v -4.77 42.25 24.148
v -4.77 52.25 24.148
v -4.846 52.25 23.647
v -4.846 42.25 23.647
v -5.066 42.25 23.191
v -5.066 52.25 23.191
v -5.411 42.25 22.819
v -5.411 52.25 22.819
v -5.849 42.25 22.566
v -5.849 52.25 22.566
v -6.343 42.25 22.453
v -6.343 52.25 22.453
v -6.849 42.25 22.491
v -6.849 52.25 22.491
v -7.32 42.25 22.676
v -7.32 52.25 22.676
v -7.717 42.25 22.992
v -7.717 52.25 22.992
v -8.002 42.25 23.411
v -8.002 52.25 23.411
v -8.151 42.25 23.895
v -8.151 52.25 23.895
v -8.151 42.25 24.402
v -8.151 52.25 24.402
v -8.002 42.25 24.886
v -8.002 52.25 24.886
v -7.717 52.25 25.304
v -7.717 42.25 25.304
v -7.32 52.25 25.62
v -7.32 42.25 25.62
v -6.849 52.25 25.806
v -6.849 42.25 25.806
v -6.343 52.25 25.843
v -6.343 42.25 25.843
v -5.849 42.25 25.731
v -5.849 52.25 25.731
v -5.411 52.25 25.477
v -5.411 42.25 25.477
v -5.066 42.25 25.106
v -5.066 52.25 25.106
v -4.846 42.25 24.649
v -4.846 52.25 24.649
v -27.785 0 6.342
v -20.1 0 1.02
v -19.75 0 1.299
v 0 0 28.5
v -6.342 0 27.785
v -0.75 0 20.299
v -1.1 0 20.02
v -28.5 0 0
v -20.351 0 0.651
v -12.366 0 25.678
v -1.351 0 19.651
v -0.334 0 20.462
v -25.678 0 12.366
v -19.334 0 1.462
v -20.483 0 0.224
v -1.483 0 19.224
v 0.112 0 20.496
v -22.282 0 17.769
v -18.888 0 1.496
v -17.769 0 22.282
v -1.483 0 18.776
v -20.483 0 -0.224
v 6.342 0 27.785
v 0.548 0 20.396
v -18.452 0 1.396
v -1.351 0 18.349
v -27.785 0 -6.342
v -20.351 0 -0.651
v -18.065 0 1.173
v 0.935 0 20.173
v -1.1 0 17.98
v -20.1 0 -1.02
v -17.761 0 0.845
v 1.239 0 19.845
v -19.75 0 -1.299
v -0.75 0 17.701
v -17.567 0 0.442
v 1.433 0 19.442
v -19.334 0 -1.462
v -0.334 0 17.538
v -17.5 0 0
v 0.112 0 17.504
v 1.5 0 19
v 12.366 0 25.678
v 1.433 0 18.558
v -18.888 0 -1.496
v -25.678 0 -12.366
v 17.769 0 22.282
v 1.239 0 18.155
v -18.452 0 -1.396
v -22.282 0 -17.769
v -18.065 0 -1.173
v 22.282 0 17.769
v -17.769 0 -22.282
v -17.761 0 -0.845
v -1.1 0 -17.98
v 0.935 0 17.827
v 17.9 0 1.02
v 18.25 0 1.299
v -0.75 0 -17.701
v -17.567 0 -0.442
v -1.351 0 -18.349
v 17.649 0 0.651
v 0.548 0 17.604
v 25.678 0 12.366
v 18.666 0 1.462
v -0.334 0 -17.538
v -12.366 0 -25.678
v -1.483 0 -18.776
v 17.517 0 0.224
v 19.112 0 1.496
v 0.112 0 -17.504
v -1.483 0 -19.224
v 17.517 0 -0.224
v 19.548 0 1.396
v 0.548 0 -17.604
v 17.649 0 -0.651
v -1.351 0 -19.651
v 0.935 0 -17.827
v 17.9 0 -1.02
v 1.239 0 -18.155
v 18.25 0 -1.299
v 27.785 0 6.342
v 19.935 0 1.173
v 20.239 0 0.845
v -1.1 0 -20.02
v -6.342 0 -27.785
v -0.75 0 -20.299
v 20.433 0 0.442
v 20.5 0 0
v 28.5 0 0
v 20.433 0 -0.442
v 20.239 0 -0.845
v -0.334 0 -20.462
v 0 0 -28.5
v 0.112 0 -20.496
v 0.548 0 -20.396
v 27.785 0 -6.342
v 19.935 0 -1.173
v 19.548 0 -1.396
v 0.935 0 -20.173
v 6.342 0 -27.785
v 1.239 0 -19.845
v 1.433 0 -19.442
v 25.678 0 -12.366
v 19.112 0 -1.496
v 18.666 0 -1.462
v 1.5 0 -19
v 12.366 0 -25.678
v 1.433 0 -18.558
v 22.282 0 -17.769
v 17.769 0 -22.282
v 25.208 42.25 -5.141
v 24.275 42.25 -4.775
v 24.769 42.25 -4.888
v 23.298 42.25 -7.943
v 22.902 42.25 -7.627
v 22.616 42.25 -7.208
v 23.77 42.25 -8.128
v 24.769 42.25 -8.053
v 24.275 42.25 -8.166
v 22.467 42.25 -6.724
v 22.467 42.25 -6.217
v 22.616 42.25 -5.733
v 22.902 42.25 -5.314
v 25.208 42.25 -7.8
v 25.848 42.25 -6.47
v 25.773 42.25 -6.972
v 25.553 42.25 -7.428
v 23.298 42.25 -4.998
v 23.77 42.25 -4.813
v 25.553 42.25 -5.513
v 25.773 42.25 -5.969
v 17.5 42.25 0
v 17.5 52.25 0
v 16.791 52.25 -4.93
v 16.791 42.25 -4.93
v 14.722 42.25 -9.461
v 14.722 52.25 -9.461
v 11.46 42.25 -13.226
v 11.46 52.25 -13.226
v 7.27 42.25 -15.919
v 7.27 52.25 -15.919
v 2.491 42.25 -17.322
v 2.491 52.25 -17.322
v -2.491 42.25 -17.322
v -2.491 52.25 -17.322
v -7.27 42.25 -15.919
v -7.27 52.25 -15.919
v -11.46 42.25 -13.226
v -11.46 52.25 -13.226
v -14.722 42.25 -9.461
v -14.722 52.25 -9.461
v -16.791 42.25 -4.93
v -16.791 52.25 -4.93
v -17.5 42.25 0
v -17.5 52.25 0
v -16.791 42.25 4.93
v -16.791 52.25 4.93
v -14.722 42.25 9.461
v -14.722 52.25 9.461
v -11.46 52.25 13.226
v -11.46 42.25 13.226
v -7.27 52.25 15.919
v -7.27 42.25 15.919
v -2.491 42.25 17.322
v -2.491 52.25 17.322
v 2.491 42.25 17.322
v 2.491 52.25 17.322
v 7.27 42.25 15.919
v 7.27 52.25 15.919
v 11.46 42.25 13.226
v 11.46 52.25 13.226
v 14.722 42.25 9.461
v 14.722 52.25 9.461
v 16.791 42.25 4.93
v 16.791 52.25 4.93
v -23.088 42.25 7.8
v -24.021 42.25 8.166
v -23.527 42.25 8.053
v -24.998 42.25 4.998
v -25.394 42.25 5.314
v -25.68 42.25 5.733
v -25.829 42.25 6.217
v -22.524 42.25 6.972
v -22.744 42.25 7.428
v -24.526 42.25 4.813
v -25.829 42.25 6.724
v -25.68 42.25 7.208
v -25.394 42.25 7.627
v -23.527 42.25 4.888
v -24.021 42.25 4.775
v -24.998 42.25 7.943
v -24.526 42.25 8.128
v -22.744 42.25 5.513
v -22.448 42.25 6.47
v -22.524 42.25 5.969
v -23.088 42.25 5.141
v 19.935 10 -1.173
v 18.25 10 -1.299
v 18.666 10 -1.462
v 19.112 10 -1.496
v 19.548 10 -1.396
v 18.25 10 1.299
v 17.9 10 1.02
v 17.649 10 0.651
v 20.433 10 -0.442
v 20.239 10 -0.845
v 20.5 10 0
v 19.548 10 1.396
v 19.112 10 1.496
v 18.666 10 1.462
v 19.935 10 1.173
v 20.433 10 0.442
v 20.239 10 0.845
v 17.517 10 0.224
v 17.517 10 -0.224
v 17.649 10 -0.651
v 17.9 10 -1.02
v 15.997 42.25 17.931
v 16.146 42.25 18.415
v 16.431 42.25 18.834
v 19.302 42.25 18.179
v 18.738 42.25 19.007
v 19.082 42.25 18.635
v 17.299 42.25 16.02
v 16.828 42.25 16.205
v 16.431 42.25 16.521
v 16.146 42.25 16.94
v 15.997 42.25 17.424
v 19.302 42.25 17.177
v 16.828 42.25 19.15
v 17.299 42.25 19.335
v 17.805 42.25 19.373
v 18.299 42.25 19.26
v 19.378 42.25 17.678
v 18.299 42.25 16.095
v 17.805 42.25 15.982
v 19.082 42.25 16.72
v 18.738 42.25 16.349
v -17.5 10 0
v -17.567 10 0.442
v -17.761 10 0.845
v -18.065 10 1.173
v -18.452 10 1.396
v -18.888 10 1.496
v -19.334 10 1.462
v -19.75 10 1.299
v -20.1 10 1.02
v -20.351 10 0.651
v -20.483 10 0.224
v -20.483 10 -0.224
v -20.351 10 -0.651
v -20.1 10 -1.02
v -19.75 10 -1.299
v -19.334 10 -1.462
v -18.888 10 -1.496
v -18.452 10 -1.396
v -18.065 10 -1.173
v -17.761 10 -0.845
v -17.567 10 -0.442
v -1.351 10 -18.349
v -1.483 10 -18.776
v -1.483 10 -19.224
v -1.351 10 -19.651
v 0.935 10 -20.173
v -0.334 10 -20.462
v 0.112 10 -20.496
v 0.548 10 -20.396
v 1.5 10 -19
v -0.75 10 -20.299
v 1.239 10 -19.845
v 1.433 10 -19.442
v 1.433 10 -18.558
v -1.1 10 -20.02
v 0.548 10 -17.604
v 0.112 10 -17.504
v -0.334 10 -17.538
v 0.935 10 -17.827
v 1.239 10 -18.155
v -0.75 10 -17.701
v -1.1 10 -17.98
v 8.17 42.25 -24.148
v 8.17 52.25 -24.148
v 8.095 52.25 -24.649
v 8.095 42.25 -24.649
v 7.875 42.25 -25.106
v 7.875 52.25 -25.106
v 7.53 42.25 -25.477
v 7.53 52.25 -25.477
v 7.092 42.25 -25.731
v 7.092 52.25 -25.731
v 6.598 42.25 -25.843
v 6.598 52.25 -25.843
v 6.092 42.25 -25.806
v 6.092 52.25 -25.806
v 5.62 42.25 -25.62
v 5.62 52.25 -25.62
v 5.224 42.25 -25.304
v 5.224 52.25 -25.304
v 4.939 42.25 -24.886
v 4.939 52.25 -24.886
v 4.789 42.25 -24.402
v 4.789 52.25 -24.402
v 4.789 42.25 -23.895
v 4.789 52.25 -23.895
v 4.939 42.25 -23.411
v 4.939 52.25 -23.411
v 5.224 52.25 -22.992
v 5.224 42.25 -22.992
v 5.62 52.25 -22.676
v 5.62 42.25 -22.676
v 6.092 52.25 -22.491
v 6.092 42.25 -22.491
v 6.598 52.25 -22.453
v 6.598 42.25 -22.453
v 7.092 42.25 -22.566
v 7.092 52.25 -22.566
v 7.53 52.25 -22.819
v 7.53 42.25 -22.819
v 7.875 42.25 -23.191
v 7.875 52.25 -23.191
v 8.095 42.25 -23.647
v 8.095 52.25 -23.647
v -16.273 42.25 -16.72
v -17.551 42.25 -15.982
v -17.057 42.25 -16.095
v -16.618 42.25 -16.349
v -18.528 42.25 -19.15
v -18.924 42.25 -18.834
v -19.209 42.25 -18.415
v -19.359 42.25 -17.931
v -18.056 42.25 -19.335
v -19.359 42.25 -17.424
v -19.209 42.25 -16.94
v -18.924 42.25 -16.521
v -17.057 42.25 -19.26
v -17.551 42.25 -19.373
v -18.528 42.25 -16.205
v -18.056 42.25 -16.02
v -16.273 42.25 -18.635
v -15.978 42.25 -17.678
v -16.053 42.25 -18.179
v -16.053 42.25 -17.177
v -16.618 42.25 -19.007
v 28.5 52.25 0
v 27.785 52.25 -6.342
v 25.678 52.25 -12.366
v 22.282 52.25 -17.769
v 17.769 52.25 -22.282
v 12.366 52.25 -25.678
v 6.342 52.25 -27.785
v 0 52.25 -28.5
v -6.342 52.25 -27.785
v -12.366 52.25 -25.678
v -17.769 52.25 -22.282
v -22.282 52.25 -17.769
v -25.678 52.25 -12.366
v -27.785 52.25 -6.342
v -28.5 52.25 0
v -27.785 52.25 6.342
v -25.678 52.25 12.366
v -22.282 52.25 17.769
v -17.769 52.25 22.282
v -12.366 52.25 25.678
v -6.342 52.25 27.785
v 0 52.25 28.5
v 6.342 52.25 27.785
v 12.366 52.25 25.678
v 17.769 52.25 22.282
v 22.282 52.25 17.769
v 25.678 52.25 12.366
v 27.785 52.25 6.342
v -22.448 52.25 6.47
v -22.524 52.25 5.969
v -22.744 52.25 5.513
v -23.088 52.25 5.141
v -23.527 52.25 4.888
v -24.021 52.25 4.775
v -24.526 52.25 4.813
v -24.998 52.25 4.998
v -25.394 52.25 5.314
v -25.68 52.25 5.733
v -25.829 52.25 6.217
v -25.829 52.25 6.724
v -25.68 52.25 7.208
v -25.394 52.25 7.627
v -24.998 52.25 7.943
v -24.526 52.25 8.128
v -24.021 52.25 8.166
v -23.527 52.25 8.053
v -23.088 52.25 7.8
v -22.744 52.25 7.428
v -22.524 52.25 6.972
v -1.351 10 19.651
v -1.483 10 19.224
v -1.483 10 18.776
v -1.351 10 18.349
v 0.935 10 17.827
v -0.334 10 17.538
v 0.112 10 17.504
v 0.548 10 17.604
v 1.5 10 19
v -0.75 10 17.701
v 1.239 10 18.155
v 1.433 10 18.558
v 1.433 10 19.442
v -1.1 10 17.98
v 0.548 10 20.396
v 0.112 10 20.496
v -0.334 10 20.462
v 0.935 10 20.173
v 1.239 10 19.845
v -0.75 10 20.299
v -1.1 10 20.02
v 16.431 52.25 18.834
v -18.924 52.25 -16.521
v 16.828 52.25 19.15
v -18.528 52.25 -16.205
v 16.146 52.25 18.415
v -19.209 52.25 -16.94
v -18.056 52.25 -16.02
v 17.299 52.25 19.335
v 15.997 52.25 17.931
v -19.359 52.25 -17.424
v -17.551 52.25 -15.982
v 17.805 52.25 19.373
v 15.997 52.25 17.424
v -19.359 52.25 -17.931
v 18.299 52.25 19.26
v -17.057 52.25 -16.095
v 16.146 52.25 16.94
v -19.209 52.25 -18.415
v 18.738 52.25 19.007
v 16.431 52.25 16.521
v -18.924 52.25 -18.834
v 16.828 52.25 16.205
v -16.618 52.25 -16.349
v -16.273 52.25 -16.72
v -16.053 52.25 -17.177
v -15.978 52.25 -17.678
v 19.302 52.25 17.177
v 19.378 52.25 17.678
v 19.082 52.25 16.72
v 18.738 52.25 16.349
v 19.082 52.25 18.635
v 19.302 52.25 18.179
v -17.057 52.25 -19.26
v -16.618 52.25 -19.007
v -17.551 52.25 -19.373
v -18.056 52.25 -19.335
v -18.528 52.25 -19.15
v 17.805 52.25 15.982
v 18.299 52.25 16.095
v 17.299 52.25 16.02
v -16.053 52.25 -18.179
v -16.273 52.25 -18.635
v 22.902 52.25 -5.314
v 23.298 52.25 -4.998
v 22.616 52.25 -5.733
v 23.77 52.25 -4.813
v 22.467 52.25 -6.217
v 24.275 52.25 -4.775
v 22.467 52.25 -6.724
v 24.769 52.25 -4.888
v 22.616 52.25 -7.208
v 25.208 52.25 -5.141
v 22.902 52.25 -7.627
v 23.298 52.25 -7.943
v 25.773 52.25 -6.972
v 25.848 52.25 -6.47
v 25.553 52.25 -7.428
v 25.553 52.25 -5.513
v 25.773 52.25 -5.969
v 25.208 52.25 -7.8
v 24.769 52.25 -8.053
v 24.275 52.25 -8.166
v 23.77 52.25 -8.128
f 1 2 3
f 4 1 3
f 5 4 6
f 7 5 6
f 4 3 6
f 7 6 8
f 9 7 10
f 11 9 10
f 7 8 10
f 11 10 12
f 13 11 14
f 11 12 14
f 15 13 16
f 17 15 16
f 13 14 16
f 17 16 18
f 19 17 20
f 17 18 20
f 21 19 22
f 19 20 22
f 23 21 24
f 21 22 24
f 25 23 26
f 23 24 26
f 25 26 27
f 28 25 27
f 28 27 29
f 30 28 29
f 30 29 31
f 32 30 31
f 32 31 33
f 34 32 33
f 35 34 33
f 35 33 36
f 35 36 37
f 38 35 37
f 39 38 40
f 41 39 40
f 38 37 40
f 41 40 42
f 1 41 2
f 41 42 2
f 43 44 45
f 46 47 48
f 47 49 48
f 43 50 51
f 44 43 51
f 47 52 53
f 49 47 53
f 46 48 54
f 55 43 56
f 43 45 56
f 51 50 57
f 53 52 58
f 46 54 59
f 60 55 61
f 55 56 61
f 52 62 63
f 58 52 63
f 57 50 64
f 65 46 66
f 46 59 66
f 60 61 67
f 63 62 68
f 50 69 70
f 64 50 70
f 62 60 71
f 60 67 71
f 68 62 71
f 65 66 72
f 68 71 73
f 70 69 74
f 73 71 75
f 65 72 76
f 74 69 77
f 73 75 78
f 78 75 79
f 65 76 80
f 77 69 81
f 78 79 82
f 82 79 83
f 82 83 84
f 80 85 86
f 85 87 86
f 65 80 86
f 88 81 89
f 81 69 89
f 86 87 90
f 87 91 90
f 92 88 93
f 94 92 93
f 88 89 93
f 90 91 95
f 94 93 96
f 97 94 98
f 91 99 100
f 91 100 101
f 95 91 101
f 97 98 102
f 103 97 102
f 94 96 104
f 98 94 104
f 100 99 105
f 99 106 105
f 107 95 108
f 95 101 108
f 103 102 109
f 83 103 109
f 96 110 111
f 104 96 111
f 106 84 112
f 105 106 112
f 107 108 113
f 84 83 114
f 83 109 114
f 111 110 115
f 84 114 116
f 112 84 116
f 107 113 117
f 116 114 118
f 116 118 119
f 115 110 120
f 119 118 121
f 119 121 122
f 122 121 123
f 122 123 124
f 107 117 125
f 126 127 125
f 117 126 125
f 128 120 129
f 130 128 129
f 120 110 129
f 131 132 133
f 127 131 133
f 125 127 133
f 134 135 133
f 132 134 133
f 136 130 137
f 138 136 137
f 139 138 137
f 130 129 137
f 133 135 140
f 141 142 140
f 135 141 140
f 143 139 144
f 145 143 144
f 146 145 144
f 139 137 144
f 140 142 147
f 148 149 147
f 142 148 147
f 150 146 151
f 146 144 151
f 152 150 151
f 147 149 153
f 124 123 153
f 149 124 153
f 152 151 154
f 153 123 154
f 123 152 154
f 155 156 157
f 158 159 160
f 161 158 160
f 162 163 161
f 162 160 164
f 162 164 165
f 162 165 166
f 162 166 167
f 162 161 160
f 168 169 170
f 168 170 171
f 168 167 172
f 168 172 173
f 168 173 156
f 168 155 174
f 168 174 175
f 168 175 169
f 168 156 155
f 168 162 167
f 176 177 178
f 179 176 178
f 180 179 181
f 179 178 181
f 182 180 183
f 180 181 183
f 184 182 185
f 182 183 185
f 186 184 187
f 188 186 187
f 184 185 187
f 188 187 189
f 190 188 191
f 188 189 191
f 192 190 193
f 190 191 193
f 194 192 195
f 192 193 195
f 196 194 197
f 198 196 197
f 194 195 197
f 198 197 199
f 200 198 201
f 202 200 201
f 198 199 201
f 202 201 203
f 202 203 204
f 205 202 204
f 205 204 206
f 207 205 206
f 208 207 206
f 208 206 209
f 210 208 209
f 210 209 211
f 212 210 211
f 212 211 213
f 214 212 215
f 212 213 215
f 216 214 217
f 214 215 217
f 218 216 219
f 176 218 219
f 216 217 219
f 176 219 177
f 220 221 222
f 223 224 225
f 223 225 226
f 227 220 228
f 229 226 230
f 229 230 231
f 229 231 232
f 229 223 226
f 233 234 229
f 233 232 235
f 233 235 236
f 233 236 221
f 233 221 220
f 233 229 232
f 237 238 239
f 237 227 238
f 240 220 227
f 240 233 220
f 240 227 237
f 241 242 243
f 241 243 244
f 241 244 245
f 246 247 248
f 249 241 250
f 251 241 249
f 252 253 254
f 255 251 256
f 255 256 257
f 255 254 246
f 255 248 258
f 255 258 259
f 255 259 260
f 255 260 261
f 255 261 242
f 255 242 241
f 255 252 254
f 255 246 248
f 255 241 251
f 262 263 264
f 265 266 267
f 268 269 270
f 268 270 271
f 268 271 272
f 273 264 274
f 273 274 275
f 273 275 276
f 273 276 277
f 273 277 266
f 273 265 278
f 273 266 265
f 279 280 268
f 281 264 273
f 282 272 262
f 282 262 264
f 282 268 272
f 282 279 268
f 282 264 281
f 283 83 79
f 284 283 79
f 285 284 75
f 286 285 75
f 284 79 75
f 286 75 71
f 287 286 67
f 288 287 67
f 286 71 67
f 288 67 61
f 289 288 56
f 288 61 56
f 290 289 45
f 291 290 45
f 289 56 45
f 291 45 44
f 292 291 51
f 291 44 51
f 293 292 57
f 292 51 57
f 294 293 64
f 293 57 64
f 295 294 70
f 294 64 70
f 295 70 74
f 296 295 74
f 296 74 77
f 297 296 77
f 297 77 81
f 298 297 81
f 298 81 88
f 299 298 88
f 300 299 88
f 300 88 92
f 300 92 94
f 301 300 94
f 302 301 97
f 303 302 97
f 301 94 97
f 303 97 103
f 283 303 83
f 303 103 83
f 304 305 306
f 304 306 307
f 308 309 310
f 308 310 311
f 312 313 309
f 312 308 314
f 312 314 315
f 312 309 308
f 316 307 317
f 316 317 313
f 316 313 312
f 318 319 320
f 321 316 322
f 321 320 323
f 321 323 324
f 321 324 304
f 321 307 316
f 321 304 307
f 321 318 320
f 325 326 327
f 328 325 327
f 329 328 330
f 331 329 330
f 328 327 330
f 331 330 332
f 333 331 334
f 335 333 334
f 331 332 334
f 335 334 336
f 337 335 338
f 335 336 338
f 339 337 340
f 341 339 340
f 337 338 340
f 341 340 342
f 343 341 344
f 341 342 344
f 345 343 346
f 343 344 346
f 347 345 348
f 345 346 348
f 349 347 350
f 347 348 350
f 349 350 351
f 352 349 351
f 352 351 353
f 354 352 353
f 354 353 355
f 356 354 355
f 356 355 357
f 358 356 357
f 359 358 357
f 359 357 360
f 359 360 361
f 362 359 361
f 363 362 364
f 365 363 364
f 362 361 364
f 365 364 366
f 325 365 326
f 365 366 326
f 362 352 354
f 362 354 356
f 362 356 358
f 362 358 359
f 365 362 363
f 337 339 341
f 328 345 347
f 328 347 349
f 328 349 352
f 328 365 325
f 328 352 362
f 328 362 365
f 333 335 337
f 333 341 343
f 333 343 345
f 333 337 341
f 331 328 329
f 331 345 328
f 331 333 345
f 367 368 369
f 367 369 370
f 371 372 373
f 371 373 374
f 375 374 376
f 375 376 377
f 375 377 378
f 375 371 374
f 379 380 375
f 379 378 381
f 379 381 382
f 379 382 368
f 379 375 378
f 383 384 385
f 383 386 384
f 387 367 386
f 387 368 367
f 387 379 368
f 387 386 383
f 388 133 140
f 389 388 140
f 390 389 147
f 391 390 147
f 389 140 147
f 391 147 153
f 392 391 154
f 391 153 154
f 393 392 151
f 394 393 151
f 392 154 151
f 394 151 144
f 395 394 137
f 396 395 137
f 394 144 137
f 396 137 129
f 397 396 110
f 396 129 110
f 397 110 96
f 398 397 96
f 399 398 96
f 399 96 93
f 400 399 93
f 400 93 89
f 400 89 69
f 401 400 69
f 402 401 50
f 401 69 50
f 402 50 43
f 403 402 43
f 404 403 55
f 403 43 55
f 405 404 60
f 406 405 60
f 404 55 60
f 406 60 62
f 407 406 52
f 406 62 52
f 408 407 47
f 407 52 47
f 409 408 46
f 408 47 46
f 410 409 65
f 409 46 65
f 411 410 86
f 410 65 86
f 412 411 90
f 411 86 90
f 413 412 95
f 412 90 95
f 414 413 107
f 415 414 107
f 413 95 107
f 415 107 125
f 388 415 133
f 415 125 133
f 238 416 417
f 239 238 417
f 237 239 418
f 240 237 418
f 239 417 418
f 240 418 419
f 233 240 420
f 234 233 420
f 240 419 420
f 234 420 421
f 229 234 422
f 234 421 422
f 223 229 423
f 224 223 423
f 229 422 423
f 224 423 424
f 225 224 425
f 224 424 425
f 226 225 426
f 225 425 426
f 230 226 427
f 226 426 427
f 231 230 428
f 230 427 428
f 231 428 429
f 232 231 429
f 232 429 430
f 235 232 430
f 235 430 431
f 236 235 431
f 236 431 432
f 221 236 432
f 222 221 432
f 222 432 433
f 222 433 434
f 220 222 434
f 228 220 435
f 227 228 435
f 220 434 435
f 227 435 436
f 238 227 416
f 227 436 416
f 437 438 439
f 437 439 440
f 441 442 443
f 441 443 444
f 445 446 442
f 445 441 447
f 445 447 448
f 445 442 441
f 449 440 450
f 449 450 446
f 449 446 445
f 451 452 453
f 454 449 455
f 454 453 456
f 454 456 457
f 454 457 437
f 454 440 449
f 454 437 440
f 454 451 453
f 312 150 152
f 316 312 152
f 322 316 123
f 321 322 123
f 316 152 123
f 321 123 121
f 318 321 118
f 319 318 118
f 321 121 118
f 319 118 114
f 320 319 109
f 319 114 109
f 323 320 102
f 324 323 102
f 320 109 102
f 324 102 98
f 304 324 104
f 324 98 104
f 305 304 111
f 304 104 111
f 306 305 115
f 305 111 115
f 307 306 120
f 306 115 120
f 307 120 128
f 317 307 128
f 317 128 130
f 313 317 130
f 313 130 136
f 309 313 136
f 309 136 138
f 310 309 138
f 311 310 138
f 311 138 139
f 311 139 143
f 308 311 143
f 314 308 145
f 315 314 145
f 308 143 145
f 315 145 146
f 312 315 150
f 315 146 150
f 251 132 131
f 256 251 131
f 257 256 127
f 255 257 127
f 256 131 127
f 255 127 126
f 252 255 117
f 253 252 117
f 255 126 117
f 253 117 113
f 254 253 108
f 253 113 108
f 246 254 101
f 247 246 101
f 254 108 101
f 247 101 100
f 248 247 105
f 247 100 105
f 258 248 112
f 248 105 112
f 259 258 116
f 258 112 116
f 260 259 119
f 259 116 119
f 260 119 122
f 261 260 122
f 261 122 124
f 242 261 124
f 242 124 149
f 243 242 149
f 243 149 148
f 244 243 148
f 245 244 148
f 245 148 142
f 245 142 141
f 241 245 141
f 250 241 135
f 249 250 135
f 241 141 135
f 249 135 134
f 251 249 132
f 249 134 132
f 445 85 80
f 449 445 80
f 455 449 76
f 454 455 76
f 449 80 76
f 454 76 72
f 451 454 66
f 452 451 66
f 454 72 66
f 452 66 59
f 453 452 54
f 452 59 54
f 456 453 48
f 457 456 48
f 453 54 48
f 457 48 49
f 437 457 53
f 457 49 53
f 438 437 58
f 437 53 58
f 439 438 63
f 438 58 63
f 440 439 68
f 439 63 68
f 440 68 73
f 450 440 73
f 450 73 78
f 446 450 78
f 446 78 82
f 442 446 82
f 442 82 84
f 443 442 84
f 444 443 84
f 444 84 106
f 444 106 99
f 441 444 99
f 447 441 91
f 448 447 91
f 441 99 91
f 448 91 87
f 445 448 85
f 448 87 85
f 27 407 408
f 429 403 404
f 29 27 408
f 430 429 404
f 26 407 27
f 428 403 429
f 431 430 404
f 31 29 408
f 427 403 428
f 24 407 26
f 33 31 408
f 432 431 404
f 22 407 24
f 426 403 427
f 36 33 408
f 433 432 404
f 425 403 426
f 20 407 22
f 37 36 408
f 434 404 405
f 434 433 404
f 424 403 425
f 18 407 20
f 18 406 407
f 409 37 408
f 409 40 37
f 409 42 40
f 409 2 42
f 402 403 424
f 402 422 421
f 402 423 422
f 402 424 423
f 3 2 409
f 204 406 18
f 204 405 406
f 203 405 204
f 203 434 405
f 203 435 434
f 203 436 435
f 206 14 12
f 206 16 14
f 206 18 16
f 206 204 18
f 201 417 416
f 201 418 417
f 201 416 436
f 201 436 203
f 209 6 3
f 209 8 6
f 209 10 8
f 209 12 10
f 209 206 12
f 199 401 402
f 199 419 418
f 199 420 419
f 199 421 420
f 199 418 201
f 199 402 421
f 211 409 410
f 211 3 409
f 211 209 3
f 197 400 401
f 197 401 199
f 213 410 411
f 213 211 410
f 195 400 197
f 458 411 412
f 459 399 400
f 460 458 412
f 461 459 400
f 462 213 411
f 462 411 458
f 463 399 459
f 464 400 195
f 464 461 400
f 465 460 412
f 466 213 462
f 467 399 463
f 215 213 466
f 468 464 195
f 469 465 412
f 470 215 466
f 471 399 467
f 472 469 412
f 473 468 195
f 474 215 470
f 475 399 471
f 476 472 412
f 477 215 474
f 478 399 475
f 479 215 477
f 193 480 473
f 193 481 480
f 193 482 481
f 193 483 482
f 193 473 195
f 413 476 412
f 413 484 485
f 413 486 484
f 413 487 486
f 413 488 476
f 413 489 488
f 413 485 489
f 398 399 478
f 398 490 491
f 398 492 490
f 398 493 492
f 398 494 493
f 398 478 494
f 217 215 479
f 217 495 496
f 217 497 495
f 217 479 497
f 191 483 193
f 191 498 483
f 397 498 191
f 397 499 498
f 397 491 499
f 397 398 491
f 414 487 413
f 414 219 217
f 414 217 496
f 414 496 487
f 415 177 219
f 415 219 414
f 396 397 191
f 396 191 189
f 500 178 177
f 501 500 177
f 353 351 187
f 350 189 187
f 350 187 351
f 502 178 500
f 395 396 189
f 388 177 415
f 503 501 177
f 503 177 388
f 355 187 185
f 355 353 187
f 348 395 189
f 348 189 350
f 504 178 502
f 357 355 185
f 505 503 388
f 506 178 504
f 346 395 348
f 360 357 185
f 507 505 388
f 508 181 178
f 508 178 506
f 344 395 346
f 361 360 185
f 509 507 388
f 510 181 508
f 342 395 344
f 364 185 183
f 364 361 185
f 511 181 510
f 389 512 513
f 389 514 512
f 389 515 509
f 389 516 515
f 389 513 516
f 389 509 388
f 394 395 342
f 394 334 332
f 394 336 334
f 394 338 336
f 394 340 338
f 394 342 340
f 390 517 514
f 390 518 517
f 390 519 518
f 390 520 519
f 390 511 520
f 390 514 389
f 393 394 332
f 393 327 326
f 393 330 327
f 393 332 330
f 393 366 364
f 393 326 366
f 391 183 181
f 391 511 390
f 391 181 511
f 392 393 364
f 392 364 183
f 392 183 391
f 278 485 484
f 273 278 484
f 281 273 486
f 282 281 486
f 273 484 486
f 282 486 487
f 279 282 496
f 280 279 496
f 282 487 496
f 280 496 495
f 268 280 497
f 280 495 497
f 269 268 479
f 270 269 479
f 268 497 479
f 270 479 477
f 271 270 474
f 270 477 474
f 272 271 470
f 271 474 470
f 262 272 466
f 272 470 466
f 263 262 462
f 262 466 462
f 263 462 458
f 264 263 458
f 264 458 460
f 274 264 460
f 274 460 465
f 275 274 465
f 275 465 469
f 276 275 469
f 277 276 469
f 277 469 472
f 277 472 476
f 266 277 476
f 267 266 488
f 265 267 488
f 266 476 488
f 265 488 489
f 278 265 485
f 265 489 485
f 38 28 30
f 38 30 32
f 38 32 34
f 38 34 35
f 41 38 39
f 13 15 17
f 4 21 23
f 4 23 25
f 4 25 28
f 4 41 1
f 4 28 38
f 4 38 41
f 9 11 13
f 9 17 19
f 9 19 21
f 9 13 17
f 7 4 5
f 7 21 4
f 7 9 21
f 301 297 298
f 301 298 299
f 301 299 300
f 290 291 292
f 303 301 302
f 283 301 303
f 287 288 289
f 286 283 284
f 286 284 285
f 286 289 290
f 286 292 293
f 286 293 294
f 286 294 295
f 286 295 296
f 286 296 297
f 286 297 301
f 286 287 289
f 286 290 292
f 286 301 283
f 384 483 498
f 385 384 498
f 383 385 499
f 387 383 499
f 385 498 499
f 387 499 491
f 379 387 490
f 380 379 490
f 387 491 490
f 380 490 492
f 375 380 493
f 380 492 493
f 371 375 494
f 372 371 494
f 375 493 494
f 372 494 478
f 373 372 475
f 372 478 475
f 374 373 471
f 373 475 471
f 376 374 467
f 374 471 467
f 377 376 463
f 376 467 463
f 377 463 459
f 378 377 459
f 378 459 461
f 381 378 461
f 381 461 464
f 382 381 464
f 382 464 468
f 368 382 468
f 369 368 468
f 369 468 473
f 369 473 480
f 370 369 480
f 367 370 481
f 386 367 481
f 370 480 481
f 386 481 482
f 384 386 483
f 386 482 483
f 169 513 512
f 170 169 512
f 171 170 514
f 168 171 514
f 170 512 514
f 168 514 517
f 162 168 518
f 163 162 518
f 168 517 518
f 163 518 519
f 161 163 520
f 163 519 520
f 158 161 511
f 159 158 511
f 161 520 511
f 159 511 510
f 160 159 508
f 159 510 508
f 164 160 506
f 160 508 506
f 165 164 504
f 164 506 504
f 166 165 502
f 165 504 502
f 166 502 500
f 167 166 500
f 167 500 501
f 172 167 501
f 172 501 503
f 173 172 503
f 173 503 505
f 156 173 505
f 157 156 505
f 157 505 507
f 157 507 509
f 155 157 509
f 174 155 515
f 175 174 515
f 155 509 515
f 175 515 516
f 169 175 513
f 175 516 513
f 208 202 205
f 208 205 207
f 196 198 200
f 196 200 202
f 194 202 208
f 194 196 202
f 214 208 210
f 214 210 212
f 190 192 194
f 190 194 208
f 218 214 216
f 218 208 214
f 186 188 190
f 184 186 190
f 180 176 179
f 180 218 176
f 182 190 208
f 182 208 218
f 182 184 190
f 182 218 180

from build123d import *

# Parameters (mm, degrees)
SKETCH_1_R          = 28.5
EXTRUDE_1_DEPTH     = 52.25
SKETCH_3_R          = 17.5
CUT_EXTRUDE_2_DEPTH = 10
SKETCH_4_R          = 1.7
CUT_EXTRUDE_3_DEPTH = 10
SKETCH_5_R          = 1.5
CUT_EXTRUDE_4_DEPTH = 10


with BuildPart() as part:
    # 草图1 → 凸台-拉伸1 (new body)
    with BuildSketch(Plane(origin=(0, 0, 0), x_dir=(1, 0, 0), z_dir=(0, 1, 0))):
        Circle(SKETCH_1_R)
    extrude(amount=EXTRUDE_1_DEPTH)

    # 草图3 → 切除-拉伸2 (cut)
    with BuildSketch(Plane(origin=(0, 52.25, 0), x_dir=(1, 0, 0), z_dir=(0, 1, 0))):
        Circle(SKETCH_3_R)
    extrude(amount=-CUT_EXTRUDE_2_DEPTH, mode=Mode.SUBTRACT)

    # 草图4 → 切除-拉伸3 (cut)
    with BuildSketch(Plane(origin=(0, 52.25, 0), x_dir=(1, 0, 0), z_dir=(0, 1, 0))):
        with Locations((17.67766953, -17.67766953)):
            Circle(SKETCH_4_R)
        with Locations((-6.470476128, -24.148145657)):
            Circle(SKETCH_4_R)
        with Locations((-24.148145657, -6.470476128)):
            Circle(SKETCH_4_R)
        with Locations((-17.67766953, 17.67766953)):
            Circle(SKETCH_4_R)
        with Locations((6.470476128, 24.148145657)):
            Circle(SKETCH_4_R)
        with Locations((24.148145657, 6.470476128)):
            Circle(SKETCH_4_R)
    extrude(amount=-CUT_EXTRUDE_3_DEPTH, mode=Mode.SUBTRACT)

    # 草图5 → 切除-拉伸4 (cut)
    with BuildSketch(Plane.XZ):
        with Locations((0, -19)):
            Circle(SKETCH_5_R)
        with Locations((-19, 0)):
            Circle(SKETCH_5_R)
        with Locations((0, 19)):
            Circle(SKETCH_5_R)
        with Locations((19, 0)):
            Circle(SKETCH_5_R)
    extrude(amount=-CUT_EXTRUDE_4_DEPTH, mode=Mode.SUBTRACT)


solid = part.part
